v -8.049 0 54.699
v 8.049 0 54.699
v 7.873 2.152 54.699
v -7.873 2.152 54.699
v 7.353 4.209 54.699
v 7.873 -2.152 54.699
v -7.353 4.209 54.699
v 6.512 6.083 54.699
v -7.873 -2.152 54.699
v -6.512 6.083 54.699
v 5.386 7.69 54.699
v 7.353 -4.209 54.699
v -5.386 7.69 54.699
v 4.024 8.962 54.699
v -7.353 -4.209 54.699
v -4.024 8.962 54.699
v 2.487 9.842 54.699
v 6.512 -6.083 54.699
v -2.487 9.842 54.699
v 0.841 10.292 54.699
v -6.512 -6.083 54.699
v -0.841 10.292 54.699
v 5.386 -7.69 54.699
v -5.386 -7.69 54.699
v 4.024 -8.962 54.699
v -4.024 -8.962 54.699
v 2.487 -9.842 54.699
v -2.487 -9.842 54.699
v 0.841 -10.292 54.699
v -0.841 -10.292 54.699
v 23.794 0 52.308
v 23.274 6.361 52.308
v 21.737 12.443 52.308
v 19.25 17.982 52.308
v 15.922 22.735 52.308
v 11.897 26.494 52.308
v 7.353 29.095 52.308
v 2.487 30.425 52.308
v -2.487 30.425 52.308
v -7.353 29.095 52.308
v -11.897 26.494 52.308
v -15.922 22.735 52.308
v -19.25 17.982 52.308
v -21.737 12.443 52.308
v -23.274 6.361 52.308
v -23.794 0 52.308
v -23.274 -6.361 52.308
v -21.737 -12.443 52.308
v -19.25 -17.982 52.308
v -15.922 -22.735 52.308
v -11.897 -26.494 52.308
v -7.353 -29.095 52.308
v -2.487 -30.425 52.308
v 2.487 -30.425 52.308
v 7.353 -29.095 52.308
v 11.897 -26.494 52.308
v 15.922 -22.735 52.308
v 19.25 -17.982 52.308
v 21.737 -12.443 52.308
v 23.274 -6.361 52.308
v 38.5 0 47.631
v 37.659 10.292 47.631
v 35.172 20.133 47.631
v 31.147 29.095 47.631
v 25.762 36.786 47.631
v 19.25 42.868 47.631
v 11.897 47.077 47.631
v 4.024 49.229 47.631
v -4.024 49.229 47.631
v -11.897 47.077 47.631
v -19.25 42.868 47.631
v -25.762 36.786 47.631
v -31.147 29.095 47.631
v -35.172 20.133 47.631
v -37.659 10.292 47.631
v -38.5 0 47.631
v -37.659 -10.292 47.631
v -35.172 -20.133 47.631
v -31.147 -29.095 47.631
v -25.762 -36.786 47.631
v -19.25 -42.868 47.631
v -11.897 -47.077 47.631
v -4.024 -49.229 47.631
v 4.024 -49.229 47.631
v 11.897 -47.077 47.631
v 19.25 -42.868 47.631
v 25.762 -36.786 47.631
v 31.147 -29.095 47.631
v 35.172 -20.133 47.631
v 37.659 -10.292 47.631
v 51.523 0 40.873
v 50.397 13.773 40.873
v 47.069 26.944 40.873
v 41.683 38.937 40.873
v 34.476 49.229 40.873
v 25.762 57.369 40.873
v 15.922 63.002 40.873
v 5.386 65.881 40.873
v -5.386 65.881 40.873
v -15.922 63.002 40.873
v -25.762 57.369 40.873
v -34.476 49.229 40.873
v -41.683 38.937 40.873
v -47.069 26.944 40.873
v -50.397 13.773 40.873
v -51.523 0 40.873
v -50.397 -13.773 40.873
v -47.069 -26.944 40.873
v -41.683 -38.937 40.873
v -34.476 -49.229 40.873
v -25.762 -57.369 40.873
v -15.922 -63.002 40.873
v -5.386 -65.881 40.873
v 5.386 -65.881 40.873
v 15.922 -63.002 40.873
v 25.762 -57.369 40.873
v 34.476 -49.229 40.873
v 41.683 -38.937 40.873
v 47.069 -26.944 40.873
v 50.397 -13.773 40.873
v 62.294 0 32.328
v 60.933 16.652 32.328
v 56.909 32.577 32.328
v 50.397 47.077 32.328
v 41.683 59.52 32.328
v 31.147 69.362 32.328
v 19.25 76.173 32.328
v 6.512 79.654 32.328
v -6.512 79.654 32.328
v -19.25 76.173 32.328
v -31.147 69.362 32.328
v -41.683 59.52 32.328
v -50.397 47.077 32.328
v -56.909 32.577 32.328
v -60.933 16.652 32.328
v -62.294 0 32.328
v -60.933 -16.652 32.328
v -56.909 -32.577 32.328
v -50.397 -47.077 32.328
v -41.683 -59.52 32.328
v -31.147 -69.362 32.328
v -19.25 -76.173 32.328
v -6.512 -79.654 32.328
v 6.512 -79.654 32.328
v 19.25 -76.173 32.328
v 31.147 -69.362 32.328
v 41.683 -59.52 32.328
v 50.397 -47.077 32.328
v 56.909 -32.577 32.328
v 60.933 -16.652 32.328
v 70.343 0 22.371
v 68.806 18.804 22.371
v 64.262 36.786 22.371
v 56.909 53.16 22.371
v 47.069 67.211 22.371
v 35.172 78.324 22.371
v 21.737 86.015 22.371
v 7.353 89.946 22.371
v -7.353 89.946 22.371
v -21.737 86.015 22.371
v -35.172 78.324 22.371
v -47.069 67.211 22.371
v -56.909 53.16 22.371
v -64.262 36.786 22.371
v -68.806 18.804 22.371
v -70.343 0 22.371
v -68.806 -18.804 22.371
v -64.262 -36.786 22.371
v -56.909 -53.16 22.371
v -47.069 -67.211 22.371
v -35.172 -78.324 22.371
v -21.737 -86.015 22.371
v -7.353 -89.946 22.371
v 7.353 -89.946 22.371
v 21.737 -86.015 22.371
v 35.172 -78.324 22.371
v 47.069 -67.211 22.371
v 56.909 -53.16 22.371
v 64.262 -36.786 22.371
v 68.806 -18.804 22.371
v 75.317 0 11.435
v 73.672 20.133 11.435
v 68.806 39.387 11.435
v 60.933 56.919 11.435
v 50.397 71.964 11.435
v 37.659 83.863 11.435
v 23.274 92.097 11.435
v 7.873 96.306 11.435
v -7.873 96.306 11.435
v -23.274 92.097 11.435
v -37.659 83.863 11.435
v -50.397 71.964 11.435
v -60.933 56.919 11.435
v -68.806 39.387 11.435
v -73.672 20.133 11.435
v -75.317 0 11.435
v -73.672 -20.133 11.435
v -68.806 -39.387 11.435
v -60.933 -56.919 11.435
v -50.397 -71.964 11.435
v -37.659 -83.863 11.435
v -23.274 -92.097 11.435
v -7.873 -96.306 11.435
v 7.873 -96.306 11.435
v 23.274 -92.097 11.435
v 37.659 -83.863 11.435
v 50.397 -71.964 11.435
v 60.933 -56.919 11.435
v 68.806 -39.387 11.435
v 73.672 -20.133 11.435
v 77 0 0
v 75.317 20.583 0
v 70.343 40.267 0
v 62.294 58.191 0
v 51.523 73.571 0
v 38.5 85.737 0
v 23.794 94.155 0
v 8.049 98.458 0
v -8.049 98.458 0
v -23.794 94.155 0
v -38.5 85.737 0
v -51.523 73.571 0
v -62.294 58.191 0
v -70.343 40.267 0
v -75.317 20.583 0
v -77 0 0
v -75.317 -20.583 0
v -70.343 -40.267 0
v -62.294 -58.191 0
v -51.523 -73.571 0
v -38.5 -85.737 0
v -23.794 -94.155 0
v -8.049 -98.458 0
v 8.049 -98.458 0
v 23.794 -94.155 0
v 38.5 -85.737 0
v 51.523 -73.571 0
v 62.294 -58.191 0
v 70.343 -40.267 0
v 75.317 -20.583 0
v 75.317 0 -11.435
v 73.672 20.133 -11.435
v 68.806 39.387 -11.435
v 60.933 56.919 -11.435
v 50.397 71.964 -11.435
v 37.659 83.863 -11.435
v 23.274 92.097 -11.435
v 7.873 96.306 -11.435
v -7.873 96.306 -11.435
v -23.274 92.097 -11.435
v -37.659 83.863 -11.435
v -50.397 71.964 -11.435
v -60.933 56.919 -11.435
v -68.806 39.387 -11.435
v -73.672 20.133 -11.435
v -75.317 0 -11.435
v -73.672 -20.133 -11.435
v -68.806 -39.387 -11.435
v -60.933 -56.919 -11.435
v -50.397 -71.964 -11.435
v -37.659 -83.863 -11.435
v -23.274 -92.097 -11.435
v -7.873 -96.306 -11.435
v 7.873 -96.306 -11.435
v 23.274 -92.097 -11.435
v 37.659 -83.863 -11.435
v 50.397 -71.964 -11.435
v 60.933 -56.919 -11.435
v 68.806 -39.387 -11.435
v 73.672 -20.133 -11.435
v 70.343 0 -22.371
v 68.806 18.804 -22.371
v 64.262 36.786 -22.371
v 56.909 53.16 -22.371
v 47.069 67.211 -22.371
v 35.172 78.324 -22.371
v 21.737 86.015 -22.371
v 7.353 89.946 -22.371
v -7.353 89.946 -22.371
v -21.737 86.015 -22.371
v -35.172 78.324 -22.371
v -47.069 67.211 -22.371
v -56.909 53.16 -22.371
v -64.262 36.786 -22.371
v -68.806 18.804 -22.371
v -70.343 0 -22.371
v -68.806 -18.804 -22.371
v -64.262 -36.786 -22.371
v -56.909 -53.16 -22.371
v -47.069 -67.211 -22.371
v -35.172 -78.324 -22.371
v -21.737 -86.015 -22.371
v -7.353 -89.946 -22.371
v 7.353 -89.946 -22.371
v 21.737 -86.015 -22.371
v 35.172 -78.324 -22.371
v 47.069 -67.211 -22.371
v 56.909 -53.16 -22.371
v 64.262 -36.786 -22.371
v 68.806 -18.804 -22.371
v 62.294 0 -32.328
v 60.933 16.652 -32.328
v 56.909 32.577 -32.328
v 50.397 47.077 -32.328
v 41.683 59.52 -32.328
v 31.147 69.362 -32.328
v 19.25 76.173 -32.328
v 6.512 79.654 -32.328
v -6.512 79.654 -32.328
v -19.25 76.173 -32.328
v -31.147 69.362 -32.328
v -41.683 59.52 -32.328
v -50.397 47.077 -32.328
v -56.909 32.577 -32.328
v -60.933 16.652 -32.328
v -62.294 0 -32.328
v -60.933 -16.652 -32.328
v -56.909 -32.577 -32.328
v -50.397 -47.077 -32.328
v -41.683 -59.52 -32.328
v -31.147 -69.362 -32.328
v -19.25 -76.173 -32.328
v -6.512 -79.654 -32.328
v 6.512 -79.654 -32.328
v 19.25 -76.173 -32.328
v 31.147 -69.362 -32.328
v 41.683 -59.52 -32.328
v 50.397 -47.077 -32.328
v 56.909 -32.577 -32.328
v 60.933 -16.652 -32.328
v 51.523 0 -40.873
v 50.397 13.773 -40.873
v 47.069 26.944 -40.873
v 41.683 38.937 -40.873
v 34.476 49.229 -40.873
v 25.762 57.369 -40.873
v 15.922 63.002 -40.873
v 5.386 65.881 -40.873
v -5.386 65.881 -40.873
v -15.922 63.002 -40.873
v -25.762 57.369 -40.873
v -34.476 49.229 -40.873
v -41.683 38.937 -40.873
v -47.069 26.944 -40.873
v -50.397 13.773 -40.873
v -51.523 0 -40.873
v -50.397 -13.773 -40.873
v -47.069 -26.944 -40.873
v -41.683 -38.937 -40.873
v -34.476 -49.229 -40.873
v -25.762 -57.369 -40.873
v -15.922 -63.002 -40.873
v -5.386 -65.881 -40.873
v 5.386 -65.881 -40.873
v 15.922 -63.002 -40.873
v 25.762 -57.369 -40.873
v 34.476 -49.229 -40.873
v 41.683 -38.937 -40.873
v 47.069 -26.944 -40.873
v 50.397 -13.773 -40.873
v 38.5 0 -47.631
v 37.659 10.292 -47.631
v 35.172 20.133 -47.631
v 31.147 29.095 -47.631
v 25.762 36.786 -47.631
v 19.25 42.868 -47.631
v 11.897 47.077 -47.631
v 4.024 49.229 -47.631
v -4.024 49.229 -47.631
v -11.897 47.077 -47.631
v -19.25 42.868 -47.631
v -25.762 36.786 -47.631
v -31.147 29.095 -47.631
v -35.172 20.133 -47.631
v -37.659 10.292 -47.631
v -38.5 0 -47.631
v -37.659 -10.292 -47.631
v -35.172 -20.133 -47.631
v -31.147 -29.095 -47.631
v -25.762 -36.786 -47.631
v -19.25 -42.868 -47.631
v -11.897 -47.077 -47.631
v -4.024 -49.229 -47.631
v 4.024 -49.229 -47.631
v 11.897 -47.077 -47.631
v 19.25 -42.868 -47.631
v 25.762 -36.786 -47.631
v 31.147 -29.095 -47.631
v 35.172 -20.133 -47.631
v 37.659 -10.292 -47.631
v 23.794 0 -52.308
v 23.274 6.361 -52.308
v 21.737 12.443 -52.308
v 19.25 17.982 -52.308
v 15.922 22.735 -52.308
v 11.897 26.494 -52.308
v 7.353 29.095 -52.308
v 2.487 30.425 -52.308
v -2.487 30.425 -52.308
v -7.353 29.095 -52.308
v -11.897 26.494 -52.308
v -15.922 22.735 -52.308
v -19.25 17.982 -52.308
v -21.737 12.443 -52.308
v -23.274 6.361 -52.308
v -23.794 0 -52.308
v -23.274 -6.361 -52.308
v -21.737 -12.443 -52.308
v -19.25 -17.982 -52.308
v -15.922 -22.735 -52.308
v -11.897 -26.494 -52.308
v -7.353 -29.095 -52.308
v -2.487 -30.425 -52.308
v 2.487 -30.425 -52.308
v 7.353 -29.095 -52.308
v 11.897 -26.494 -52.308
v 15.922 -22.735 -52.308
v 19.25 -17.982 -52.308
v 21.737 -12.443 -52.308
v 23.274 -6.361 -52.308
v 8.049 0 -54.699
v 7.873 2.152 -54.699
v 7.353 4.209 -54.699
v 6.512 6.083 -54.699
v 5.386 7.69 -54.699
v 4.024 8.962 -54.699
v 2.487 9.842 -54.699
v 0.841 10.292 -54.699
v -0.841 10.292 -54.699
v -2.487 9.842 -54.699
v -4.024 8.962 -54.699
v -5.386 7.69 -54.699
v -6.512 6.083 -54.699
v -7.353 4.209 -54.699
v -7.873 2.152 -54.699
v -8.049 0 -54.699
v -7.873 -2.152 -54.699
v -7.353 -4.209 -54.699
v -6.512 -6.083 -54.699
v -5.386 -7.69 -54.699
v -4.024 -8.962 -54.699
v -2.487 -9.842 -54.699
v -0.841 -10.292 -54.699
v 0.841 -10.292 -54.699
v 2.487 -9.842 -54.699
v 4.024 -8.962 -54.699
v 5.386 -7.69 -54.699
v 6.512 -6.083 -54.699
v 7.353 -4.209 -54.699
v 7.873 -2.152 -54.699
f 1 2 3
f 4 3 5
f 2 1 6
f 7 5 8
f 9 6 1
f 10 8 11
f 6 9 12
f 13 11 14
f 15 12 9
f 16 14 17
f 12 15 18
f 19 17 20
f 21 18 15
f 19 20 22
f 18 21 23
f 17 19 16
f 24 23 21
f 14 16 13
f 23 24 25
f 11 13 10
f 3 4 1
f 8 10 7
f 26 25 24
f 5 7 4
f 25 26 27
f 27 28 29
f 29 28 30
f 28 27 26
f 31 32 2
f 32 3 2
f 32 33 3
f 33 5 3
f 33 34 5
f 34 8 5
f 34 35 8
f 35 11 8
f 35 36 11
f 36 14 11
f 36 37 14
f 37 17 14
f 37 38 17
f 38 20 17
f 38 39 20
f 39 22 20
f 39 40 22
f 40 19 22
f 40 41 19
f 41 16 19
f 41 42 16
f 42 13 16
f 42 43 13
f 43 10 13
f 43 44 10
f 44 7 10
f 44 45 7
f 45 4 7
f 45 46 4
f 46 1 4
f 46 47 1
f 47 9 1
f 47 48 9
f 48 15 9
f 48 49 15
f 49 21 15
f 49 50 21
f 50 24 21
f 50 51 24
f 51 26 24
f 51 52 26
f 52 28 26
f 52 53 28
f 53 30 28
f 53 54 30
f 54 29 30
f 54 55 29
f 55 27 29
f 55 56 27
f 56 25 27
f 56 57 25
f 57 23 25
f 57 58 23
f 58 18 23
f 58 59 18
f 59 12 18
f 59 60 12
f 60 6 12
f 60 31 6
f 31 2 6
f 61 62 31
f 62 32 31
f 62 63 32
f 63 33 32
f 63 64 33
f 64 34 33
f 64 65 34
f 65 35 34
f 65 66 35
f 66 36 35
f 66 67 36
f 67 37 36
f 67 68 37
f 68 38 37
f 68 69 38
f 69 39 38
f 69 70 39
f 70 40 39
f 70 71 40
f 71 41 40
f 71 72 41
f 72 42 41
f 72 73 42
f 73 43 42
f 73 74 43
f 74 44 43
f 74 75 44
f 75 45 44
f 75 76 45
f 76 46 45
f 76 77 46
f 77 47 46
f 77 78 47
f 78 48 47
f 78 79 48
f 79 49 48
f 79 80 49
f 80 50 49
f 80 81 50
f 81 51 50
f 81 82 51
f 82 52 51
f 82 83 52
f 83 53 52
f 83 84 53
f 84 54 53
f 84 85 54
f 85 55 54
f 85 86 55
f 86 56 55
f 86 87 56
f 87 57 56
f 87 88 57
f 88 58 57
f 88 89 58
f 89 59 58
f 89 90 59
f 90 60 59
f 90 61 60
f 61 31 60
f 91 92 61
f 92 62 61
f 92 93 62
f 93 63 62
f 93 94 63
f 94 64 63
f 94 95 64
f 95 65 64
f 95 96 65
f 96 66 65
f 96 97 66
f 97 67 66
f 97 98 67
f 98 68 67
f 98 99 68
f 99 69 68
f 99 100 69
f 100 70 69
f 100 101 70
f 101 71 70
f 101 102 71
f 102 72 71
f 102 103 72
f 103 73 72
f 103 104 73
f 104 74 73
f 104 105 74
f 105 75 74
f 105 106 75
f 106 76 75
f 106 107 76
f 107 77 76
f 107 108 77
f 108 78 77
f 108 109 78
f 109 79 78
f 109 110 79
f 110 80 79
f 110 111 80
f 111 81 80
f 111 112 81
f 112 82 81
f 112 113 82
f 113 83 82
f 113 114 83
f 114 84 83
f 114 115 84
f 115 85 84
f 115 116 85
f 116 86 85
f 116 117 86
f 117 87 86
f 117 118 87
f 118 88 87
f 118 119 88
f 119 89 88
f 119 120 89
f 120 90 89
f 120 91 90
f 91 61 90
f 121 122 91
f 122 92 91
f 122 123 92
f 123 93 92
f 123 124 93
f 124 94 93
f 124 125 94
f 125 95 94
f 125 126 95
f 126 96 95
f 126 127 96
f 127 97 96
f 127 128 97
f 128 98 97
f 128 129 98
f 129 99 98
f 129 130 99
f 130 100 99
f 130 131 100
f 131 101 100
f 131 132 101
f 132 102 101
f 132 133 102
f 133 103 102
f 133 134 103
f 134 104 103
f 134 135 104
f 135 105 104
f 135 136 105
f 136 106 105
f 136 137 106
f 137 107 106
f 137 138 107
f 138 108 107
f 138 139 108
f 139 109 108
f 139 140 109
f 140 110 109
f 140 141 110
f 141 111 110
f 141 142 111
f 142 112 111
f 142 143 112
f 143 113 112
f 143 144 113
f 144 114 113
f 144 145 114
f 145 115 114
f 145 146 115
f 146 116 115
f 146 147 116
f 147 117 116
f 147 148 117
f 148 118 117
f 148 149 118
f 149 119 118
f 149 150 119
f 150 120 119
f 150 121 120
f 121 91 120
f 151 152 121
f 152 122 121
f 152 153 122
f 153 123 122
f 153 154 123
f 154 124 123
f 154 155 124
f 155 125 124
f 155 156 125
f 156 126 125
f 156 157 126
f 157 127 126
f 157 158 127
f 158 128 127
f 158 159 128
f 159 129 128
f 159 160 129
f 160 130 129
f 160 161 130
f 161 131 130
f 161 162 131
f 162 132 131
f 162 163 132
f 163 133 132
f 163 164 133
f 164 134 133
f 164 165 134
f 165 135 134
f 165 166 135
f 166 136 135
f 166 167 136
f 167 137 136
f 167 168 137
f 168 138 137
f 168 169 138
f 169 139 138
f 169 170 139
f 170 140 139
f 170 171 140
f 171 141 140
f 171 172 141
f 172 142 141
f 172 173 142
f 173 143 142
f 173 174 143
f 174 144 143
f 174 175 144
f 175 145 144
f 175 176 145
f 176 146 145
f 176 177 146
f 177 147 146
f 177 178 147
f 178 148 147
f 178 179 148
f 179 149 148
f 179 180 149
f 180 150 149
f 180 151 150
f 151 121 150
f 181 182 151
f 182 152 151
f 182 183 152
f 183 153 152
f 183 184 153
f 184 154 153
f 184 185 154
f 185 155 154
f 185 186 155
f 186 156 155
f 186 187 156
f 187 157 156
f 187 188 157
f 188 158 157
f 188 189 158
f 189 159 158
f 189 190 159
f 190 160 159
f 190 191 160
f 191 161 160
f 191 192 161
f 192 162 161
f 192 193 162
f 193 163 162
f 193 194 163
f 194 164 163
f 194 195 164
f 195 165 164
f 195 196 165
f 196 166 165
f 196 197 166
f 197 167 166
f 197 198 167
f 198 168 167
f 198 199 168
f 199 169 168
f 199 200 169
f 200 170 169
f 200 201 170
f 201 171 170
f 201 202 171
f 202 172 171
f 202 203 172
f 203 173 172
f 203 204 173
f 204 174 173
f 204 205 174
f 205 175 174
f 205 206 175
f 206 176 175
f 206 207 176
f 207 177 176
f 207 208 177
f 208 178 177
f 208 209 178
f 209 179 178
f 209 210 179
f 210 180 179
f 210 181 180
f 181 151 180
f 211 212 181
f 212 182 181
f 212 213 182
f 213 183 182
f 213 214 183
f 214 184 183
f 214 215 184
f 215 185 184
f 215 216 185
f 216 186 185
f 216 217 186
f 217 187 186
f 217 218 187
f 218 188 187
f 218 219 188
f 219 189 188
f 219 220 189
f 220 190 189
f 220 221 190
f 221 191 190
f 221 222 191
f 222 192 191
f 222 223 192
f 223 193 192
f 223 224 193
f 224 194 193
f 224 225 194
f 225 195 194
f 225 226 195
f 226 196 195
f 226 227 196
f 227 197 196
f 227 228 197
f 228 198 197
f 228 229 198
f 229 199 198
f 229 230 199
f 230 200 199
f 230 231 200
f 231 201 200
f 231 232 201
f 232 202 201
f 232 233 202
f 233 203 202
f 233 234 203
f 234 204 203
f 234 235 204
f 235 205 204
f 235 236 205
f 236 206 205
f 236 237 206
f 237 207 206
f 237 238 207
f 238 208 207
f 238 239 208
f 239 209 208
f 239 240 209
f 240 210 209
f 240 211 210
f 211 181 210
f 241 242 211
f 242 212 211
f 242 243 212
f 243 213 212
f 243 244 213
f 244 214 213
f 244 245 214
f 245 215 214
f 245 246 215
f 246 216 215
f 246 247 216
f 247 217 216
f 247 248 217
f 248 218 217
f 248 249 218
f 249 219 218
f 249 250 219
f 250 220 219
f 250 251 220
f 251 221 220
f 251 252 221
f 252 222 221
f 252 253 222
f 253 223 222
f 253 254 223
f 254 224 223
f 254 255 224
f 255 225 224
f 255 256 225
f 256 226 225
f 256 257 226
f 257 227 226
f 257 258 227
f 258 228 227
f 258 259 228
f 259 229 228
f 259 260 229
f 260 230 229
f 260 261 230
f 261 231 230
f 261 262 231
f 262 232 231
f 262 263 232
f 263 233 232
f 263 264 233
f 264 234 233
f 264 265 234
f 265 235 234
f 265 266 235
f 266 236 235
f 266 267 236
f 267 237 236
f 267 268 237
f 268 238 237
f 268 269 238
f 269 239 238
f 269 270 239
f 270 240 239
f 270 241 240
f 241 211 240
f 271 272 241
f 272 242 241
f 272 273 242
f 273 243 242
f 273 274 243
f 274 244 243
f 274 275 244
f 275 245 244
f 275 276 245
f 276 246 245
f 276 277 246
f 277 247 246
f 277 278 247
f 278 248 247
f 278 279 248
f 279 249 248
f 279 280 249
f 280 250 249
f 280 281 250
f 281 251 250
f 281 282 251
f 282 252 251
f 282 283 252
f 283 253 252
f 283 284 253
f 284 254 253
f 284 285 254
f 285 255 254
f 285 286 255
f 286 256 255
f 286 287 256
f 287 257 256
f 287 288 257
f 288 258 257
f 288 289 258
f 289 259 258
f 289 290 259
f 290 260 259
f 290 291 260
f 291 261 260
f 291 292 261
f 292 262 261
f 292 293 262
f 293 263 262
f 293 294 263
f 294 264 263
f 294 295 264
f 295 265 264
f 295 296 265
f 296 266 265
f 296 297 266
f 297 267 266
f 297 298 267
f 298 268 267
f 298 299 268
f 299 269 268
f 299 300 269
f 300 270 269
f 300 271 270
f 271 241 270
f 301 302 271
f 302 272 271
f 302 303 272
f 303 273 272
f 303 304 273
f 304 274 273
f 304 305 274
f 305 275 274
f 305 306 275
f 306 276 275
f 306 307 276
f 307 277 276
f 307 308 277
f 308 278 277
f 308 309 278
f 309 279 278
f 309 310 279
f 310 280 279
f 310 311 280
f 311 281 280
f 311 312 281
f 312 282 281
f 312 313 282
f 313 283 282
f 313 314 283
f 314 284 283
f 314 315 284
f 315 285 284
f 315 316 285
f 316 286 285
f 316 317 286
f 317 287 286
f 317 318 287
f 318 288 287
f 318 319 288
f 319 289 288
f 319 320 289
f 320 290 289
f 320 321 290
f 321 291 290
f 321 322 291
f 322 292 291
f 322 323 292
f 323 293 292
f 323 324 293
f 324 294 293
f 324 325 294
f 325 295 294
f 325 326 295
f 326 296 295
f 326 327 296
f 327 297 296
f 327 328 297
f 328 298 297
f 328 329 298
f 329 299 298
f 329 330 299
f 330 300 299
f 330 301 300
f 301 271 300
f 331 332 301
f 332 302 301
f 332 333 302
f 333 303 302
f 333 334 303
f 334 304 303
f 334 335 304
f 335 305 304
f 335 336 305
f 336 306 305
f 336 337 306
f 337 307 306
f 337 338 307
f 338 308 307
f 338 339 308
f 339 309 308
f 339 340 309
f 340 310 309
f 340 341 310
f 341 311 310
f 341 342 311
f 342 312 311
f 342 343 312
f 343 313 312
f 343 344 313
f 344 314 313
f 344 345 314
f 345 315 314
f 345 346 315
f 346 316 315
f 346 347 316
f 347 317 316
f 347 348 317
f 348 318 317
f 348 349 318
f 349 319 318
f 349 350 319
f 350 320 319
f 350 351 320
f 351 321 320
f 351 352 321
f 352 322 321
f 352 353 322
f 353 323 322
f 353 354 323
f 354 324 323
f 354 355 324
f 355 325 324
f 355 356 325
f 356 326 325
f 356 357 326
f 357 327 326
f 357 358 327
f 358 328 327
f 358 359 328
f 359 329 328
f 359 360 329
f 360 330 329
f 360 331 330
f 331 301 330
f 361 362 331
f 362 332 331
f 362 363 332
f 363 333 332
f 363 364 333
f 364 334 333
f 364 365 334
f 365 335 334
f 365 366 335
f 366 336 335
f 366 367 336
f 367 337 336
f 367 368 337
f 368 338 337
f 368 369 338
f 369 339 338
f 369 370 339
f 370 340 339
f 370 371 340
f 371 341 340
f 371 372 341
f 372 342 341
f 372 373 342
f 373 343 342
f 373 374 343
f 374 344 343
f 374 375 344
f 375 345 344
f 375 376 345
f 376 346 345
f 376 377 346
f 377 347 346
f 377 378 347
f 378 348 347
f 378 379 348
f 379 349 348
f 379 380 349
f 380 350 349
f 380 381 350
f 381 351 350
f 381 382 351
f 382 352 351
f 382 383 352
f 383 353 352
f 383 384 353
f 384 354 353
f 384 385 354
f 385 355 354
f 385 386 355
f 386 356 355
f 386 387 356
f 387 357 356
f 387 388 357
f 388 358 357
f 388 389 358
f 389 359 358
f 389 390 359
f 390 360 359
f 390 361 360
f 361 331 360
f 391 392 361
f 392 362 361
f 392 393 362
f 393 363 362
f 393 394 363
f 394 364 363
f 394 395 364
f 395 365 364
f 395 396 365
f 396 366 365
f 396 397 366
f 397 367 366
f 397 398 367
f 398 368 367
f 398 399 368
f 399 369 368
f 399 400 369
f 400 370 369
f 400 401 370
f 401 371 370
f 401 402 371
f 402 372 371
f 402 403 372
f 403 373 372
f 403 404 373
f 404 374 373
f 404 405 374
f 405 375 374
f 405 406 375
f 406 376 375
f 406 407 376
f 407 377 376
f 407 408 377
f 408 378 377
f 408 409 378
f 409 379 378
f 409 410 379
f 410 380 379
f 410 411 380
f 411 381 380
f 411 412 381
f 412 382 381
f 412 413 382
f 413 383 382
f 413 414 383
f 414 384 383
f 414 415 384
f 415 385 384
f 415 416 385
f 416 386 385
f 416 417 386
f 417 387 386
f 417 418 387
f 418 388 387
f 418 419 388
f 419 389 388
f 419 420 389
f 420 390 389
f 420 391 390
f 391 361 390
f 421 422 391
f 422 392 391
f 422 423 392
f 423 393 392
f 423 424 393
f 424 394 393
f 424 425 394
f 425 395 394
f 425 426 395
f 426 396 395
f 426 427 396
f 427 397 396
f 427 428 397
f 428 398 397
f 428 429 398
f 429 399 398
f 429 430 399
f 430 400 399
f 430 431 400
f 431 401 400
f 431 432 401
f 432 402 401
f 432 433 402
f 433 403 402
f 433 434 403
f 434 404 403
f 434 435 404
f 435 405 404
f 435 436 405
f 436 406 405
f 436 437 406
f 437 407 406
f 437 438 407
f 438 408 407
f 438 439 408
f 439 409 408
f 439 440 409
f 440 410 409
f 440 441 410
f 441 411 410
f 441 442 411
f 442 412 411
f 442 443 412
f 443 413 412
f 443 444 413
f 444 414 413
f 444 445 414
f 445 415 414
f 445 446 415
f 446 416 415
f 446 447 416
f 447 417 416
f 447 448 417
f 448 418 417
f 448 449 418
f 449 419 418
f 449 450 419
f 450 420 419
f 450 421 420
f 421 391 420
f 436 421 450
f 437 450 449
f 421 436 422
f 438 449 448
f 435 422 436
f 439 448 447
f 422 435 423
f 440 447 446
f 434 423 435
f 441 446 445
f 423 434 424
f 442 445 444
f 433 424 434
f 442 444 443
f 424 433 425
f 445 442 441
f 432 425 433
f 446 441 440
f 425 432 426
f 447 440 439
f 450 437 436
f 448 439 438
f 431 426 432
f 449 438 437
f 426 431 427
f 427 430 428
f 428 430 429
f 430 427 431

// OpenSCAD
// Generated by SolidPython 1.0.1 on 2020-07-29 00:46:47


scale(v = [7, 9, 5]) {
	sphere(r = 11);
}
/***********************************************
*********      SolidPython code:      **********
************************************************
 
# import packages: SolidPython
from solid import *
from solid.utils import *
from itertools import chain, combinations, permutations


class Resize:

    def __init__(self, scad_file):
        self.scad_file = scad_file
        #self.scad_file = import_scad(scad_file)
        # cone/cylinder param:
        self.r1 = 0
        self.r2 = 0
        self.h = 0
        # rectangular prism param:
        self.w = 0
        self.l = 0
        # ellipse param:
        self.r = 0

    # import OpenScad code (file name corresponds to shape)


    # classify shape + parameters
    def assign(self, param1, param2, param3):
        if self.scad_file == 'cone.scad':
            self.r1 = param1
            self.r2 = param2
            self.h = param3
        elif self.scad_file == 'cylinder.scad':
            self.r1 = param1
            self.r2 = param2
            self.h = param3
        elif self.scad_file == 'rectangularPrism.scad':
            self.h = param1
            self.l = param2
            self.w = param3
        else:
            self.r = param1
            self.h = param2

    # resize parameters
    def iterate(self):
        x = range(3, 20, 2)
        i = 1
        if self.scad_file == 'cone.scad':
            tempList = list(permutations(x, 2))
            for temp in tempList:
                param1 = temp[0]
                param2 = temp[1]
                filepath = 'produced_scad_files/' + 'cone' + str(param1) + '_' + str(param2) + '_' + '.scad'
                scad_render_to_file(cylinder(h=param1, r1=param2, r2=0), filepath)

        elif self.scad_file == 'cylinder.scad':
            tempList = list(permutations(x, 3))
            for temp in tempList:
                param1 = temp[0]
                param2 = temp[1]
                filepath = 'produced_scad_files/' + 'cylinder' + str(param1) + '_' + str(param2) + '_' + '.scad'
                scad_render_to_file(cylinder(h=param1, r1=param2, r2=param2), filepath)

        elif self.scad_file == 'rectangularPrism.scad':
            tempList = list(permutations(x, 3))
            for temp in tempList:
                param1 = temp[0]
                param2 = temp[1]
                param3 = temp[2]
                filepath = 'produced_scad_files/' + 'rectangularPrism' + str(param1) + '_' + str(param2) + '_' + str(
                    param3) + '.scad'
                scad_render_to_file(cube(size=(param1, param2, param3)), filepath)

        elif self.scad_file == 'ellipse.scad':
            tempList = list(permutations(x, 4))
            for temp in tempList:
                param1 = temp[0]
                param2 = temp[1]
                param3 = temp[2]
                param4 = temp[3]
                filepath = 'produced_scad_files/' + 'ellipse' + str(param1) + '_' + str(param2) + '_' + str(param3) + '_' + str(param4) + '.scad'
                scad_render_to_file(scale([param1, param2, param3])(sphere(r=param4)), filepath)

    def render_to_scadfile(self):
        scad_render_to_file(scad, 'example.scad') 
 
************************************************/
